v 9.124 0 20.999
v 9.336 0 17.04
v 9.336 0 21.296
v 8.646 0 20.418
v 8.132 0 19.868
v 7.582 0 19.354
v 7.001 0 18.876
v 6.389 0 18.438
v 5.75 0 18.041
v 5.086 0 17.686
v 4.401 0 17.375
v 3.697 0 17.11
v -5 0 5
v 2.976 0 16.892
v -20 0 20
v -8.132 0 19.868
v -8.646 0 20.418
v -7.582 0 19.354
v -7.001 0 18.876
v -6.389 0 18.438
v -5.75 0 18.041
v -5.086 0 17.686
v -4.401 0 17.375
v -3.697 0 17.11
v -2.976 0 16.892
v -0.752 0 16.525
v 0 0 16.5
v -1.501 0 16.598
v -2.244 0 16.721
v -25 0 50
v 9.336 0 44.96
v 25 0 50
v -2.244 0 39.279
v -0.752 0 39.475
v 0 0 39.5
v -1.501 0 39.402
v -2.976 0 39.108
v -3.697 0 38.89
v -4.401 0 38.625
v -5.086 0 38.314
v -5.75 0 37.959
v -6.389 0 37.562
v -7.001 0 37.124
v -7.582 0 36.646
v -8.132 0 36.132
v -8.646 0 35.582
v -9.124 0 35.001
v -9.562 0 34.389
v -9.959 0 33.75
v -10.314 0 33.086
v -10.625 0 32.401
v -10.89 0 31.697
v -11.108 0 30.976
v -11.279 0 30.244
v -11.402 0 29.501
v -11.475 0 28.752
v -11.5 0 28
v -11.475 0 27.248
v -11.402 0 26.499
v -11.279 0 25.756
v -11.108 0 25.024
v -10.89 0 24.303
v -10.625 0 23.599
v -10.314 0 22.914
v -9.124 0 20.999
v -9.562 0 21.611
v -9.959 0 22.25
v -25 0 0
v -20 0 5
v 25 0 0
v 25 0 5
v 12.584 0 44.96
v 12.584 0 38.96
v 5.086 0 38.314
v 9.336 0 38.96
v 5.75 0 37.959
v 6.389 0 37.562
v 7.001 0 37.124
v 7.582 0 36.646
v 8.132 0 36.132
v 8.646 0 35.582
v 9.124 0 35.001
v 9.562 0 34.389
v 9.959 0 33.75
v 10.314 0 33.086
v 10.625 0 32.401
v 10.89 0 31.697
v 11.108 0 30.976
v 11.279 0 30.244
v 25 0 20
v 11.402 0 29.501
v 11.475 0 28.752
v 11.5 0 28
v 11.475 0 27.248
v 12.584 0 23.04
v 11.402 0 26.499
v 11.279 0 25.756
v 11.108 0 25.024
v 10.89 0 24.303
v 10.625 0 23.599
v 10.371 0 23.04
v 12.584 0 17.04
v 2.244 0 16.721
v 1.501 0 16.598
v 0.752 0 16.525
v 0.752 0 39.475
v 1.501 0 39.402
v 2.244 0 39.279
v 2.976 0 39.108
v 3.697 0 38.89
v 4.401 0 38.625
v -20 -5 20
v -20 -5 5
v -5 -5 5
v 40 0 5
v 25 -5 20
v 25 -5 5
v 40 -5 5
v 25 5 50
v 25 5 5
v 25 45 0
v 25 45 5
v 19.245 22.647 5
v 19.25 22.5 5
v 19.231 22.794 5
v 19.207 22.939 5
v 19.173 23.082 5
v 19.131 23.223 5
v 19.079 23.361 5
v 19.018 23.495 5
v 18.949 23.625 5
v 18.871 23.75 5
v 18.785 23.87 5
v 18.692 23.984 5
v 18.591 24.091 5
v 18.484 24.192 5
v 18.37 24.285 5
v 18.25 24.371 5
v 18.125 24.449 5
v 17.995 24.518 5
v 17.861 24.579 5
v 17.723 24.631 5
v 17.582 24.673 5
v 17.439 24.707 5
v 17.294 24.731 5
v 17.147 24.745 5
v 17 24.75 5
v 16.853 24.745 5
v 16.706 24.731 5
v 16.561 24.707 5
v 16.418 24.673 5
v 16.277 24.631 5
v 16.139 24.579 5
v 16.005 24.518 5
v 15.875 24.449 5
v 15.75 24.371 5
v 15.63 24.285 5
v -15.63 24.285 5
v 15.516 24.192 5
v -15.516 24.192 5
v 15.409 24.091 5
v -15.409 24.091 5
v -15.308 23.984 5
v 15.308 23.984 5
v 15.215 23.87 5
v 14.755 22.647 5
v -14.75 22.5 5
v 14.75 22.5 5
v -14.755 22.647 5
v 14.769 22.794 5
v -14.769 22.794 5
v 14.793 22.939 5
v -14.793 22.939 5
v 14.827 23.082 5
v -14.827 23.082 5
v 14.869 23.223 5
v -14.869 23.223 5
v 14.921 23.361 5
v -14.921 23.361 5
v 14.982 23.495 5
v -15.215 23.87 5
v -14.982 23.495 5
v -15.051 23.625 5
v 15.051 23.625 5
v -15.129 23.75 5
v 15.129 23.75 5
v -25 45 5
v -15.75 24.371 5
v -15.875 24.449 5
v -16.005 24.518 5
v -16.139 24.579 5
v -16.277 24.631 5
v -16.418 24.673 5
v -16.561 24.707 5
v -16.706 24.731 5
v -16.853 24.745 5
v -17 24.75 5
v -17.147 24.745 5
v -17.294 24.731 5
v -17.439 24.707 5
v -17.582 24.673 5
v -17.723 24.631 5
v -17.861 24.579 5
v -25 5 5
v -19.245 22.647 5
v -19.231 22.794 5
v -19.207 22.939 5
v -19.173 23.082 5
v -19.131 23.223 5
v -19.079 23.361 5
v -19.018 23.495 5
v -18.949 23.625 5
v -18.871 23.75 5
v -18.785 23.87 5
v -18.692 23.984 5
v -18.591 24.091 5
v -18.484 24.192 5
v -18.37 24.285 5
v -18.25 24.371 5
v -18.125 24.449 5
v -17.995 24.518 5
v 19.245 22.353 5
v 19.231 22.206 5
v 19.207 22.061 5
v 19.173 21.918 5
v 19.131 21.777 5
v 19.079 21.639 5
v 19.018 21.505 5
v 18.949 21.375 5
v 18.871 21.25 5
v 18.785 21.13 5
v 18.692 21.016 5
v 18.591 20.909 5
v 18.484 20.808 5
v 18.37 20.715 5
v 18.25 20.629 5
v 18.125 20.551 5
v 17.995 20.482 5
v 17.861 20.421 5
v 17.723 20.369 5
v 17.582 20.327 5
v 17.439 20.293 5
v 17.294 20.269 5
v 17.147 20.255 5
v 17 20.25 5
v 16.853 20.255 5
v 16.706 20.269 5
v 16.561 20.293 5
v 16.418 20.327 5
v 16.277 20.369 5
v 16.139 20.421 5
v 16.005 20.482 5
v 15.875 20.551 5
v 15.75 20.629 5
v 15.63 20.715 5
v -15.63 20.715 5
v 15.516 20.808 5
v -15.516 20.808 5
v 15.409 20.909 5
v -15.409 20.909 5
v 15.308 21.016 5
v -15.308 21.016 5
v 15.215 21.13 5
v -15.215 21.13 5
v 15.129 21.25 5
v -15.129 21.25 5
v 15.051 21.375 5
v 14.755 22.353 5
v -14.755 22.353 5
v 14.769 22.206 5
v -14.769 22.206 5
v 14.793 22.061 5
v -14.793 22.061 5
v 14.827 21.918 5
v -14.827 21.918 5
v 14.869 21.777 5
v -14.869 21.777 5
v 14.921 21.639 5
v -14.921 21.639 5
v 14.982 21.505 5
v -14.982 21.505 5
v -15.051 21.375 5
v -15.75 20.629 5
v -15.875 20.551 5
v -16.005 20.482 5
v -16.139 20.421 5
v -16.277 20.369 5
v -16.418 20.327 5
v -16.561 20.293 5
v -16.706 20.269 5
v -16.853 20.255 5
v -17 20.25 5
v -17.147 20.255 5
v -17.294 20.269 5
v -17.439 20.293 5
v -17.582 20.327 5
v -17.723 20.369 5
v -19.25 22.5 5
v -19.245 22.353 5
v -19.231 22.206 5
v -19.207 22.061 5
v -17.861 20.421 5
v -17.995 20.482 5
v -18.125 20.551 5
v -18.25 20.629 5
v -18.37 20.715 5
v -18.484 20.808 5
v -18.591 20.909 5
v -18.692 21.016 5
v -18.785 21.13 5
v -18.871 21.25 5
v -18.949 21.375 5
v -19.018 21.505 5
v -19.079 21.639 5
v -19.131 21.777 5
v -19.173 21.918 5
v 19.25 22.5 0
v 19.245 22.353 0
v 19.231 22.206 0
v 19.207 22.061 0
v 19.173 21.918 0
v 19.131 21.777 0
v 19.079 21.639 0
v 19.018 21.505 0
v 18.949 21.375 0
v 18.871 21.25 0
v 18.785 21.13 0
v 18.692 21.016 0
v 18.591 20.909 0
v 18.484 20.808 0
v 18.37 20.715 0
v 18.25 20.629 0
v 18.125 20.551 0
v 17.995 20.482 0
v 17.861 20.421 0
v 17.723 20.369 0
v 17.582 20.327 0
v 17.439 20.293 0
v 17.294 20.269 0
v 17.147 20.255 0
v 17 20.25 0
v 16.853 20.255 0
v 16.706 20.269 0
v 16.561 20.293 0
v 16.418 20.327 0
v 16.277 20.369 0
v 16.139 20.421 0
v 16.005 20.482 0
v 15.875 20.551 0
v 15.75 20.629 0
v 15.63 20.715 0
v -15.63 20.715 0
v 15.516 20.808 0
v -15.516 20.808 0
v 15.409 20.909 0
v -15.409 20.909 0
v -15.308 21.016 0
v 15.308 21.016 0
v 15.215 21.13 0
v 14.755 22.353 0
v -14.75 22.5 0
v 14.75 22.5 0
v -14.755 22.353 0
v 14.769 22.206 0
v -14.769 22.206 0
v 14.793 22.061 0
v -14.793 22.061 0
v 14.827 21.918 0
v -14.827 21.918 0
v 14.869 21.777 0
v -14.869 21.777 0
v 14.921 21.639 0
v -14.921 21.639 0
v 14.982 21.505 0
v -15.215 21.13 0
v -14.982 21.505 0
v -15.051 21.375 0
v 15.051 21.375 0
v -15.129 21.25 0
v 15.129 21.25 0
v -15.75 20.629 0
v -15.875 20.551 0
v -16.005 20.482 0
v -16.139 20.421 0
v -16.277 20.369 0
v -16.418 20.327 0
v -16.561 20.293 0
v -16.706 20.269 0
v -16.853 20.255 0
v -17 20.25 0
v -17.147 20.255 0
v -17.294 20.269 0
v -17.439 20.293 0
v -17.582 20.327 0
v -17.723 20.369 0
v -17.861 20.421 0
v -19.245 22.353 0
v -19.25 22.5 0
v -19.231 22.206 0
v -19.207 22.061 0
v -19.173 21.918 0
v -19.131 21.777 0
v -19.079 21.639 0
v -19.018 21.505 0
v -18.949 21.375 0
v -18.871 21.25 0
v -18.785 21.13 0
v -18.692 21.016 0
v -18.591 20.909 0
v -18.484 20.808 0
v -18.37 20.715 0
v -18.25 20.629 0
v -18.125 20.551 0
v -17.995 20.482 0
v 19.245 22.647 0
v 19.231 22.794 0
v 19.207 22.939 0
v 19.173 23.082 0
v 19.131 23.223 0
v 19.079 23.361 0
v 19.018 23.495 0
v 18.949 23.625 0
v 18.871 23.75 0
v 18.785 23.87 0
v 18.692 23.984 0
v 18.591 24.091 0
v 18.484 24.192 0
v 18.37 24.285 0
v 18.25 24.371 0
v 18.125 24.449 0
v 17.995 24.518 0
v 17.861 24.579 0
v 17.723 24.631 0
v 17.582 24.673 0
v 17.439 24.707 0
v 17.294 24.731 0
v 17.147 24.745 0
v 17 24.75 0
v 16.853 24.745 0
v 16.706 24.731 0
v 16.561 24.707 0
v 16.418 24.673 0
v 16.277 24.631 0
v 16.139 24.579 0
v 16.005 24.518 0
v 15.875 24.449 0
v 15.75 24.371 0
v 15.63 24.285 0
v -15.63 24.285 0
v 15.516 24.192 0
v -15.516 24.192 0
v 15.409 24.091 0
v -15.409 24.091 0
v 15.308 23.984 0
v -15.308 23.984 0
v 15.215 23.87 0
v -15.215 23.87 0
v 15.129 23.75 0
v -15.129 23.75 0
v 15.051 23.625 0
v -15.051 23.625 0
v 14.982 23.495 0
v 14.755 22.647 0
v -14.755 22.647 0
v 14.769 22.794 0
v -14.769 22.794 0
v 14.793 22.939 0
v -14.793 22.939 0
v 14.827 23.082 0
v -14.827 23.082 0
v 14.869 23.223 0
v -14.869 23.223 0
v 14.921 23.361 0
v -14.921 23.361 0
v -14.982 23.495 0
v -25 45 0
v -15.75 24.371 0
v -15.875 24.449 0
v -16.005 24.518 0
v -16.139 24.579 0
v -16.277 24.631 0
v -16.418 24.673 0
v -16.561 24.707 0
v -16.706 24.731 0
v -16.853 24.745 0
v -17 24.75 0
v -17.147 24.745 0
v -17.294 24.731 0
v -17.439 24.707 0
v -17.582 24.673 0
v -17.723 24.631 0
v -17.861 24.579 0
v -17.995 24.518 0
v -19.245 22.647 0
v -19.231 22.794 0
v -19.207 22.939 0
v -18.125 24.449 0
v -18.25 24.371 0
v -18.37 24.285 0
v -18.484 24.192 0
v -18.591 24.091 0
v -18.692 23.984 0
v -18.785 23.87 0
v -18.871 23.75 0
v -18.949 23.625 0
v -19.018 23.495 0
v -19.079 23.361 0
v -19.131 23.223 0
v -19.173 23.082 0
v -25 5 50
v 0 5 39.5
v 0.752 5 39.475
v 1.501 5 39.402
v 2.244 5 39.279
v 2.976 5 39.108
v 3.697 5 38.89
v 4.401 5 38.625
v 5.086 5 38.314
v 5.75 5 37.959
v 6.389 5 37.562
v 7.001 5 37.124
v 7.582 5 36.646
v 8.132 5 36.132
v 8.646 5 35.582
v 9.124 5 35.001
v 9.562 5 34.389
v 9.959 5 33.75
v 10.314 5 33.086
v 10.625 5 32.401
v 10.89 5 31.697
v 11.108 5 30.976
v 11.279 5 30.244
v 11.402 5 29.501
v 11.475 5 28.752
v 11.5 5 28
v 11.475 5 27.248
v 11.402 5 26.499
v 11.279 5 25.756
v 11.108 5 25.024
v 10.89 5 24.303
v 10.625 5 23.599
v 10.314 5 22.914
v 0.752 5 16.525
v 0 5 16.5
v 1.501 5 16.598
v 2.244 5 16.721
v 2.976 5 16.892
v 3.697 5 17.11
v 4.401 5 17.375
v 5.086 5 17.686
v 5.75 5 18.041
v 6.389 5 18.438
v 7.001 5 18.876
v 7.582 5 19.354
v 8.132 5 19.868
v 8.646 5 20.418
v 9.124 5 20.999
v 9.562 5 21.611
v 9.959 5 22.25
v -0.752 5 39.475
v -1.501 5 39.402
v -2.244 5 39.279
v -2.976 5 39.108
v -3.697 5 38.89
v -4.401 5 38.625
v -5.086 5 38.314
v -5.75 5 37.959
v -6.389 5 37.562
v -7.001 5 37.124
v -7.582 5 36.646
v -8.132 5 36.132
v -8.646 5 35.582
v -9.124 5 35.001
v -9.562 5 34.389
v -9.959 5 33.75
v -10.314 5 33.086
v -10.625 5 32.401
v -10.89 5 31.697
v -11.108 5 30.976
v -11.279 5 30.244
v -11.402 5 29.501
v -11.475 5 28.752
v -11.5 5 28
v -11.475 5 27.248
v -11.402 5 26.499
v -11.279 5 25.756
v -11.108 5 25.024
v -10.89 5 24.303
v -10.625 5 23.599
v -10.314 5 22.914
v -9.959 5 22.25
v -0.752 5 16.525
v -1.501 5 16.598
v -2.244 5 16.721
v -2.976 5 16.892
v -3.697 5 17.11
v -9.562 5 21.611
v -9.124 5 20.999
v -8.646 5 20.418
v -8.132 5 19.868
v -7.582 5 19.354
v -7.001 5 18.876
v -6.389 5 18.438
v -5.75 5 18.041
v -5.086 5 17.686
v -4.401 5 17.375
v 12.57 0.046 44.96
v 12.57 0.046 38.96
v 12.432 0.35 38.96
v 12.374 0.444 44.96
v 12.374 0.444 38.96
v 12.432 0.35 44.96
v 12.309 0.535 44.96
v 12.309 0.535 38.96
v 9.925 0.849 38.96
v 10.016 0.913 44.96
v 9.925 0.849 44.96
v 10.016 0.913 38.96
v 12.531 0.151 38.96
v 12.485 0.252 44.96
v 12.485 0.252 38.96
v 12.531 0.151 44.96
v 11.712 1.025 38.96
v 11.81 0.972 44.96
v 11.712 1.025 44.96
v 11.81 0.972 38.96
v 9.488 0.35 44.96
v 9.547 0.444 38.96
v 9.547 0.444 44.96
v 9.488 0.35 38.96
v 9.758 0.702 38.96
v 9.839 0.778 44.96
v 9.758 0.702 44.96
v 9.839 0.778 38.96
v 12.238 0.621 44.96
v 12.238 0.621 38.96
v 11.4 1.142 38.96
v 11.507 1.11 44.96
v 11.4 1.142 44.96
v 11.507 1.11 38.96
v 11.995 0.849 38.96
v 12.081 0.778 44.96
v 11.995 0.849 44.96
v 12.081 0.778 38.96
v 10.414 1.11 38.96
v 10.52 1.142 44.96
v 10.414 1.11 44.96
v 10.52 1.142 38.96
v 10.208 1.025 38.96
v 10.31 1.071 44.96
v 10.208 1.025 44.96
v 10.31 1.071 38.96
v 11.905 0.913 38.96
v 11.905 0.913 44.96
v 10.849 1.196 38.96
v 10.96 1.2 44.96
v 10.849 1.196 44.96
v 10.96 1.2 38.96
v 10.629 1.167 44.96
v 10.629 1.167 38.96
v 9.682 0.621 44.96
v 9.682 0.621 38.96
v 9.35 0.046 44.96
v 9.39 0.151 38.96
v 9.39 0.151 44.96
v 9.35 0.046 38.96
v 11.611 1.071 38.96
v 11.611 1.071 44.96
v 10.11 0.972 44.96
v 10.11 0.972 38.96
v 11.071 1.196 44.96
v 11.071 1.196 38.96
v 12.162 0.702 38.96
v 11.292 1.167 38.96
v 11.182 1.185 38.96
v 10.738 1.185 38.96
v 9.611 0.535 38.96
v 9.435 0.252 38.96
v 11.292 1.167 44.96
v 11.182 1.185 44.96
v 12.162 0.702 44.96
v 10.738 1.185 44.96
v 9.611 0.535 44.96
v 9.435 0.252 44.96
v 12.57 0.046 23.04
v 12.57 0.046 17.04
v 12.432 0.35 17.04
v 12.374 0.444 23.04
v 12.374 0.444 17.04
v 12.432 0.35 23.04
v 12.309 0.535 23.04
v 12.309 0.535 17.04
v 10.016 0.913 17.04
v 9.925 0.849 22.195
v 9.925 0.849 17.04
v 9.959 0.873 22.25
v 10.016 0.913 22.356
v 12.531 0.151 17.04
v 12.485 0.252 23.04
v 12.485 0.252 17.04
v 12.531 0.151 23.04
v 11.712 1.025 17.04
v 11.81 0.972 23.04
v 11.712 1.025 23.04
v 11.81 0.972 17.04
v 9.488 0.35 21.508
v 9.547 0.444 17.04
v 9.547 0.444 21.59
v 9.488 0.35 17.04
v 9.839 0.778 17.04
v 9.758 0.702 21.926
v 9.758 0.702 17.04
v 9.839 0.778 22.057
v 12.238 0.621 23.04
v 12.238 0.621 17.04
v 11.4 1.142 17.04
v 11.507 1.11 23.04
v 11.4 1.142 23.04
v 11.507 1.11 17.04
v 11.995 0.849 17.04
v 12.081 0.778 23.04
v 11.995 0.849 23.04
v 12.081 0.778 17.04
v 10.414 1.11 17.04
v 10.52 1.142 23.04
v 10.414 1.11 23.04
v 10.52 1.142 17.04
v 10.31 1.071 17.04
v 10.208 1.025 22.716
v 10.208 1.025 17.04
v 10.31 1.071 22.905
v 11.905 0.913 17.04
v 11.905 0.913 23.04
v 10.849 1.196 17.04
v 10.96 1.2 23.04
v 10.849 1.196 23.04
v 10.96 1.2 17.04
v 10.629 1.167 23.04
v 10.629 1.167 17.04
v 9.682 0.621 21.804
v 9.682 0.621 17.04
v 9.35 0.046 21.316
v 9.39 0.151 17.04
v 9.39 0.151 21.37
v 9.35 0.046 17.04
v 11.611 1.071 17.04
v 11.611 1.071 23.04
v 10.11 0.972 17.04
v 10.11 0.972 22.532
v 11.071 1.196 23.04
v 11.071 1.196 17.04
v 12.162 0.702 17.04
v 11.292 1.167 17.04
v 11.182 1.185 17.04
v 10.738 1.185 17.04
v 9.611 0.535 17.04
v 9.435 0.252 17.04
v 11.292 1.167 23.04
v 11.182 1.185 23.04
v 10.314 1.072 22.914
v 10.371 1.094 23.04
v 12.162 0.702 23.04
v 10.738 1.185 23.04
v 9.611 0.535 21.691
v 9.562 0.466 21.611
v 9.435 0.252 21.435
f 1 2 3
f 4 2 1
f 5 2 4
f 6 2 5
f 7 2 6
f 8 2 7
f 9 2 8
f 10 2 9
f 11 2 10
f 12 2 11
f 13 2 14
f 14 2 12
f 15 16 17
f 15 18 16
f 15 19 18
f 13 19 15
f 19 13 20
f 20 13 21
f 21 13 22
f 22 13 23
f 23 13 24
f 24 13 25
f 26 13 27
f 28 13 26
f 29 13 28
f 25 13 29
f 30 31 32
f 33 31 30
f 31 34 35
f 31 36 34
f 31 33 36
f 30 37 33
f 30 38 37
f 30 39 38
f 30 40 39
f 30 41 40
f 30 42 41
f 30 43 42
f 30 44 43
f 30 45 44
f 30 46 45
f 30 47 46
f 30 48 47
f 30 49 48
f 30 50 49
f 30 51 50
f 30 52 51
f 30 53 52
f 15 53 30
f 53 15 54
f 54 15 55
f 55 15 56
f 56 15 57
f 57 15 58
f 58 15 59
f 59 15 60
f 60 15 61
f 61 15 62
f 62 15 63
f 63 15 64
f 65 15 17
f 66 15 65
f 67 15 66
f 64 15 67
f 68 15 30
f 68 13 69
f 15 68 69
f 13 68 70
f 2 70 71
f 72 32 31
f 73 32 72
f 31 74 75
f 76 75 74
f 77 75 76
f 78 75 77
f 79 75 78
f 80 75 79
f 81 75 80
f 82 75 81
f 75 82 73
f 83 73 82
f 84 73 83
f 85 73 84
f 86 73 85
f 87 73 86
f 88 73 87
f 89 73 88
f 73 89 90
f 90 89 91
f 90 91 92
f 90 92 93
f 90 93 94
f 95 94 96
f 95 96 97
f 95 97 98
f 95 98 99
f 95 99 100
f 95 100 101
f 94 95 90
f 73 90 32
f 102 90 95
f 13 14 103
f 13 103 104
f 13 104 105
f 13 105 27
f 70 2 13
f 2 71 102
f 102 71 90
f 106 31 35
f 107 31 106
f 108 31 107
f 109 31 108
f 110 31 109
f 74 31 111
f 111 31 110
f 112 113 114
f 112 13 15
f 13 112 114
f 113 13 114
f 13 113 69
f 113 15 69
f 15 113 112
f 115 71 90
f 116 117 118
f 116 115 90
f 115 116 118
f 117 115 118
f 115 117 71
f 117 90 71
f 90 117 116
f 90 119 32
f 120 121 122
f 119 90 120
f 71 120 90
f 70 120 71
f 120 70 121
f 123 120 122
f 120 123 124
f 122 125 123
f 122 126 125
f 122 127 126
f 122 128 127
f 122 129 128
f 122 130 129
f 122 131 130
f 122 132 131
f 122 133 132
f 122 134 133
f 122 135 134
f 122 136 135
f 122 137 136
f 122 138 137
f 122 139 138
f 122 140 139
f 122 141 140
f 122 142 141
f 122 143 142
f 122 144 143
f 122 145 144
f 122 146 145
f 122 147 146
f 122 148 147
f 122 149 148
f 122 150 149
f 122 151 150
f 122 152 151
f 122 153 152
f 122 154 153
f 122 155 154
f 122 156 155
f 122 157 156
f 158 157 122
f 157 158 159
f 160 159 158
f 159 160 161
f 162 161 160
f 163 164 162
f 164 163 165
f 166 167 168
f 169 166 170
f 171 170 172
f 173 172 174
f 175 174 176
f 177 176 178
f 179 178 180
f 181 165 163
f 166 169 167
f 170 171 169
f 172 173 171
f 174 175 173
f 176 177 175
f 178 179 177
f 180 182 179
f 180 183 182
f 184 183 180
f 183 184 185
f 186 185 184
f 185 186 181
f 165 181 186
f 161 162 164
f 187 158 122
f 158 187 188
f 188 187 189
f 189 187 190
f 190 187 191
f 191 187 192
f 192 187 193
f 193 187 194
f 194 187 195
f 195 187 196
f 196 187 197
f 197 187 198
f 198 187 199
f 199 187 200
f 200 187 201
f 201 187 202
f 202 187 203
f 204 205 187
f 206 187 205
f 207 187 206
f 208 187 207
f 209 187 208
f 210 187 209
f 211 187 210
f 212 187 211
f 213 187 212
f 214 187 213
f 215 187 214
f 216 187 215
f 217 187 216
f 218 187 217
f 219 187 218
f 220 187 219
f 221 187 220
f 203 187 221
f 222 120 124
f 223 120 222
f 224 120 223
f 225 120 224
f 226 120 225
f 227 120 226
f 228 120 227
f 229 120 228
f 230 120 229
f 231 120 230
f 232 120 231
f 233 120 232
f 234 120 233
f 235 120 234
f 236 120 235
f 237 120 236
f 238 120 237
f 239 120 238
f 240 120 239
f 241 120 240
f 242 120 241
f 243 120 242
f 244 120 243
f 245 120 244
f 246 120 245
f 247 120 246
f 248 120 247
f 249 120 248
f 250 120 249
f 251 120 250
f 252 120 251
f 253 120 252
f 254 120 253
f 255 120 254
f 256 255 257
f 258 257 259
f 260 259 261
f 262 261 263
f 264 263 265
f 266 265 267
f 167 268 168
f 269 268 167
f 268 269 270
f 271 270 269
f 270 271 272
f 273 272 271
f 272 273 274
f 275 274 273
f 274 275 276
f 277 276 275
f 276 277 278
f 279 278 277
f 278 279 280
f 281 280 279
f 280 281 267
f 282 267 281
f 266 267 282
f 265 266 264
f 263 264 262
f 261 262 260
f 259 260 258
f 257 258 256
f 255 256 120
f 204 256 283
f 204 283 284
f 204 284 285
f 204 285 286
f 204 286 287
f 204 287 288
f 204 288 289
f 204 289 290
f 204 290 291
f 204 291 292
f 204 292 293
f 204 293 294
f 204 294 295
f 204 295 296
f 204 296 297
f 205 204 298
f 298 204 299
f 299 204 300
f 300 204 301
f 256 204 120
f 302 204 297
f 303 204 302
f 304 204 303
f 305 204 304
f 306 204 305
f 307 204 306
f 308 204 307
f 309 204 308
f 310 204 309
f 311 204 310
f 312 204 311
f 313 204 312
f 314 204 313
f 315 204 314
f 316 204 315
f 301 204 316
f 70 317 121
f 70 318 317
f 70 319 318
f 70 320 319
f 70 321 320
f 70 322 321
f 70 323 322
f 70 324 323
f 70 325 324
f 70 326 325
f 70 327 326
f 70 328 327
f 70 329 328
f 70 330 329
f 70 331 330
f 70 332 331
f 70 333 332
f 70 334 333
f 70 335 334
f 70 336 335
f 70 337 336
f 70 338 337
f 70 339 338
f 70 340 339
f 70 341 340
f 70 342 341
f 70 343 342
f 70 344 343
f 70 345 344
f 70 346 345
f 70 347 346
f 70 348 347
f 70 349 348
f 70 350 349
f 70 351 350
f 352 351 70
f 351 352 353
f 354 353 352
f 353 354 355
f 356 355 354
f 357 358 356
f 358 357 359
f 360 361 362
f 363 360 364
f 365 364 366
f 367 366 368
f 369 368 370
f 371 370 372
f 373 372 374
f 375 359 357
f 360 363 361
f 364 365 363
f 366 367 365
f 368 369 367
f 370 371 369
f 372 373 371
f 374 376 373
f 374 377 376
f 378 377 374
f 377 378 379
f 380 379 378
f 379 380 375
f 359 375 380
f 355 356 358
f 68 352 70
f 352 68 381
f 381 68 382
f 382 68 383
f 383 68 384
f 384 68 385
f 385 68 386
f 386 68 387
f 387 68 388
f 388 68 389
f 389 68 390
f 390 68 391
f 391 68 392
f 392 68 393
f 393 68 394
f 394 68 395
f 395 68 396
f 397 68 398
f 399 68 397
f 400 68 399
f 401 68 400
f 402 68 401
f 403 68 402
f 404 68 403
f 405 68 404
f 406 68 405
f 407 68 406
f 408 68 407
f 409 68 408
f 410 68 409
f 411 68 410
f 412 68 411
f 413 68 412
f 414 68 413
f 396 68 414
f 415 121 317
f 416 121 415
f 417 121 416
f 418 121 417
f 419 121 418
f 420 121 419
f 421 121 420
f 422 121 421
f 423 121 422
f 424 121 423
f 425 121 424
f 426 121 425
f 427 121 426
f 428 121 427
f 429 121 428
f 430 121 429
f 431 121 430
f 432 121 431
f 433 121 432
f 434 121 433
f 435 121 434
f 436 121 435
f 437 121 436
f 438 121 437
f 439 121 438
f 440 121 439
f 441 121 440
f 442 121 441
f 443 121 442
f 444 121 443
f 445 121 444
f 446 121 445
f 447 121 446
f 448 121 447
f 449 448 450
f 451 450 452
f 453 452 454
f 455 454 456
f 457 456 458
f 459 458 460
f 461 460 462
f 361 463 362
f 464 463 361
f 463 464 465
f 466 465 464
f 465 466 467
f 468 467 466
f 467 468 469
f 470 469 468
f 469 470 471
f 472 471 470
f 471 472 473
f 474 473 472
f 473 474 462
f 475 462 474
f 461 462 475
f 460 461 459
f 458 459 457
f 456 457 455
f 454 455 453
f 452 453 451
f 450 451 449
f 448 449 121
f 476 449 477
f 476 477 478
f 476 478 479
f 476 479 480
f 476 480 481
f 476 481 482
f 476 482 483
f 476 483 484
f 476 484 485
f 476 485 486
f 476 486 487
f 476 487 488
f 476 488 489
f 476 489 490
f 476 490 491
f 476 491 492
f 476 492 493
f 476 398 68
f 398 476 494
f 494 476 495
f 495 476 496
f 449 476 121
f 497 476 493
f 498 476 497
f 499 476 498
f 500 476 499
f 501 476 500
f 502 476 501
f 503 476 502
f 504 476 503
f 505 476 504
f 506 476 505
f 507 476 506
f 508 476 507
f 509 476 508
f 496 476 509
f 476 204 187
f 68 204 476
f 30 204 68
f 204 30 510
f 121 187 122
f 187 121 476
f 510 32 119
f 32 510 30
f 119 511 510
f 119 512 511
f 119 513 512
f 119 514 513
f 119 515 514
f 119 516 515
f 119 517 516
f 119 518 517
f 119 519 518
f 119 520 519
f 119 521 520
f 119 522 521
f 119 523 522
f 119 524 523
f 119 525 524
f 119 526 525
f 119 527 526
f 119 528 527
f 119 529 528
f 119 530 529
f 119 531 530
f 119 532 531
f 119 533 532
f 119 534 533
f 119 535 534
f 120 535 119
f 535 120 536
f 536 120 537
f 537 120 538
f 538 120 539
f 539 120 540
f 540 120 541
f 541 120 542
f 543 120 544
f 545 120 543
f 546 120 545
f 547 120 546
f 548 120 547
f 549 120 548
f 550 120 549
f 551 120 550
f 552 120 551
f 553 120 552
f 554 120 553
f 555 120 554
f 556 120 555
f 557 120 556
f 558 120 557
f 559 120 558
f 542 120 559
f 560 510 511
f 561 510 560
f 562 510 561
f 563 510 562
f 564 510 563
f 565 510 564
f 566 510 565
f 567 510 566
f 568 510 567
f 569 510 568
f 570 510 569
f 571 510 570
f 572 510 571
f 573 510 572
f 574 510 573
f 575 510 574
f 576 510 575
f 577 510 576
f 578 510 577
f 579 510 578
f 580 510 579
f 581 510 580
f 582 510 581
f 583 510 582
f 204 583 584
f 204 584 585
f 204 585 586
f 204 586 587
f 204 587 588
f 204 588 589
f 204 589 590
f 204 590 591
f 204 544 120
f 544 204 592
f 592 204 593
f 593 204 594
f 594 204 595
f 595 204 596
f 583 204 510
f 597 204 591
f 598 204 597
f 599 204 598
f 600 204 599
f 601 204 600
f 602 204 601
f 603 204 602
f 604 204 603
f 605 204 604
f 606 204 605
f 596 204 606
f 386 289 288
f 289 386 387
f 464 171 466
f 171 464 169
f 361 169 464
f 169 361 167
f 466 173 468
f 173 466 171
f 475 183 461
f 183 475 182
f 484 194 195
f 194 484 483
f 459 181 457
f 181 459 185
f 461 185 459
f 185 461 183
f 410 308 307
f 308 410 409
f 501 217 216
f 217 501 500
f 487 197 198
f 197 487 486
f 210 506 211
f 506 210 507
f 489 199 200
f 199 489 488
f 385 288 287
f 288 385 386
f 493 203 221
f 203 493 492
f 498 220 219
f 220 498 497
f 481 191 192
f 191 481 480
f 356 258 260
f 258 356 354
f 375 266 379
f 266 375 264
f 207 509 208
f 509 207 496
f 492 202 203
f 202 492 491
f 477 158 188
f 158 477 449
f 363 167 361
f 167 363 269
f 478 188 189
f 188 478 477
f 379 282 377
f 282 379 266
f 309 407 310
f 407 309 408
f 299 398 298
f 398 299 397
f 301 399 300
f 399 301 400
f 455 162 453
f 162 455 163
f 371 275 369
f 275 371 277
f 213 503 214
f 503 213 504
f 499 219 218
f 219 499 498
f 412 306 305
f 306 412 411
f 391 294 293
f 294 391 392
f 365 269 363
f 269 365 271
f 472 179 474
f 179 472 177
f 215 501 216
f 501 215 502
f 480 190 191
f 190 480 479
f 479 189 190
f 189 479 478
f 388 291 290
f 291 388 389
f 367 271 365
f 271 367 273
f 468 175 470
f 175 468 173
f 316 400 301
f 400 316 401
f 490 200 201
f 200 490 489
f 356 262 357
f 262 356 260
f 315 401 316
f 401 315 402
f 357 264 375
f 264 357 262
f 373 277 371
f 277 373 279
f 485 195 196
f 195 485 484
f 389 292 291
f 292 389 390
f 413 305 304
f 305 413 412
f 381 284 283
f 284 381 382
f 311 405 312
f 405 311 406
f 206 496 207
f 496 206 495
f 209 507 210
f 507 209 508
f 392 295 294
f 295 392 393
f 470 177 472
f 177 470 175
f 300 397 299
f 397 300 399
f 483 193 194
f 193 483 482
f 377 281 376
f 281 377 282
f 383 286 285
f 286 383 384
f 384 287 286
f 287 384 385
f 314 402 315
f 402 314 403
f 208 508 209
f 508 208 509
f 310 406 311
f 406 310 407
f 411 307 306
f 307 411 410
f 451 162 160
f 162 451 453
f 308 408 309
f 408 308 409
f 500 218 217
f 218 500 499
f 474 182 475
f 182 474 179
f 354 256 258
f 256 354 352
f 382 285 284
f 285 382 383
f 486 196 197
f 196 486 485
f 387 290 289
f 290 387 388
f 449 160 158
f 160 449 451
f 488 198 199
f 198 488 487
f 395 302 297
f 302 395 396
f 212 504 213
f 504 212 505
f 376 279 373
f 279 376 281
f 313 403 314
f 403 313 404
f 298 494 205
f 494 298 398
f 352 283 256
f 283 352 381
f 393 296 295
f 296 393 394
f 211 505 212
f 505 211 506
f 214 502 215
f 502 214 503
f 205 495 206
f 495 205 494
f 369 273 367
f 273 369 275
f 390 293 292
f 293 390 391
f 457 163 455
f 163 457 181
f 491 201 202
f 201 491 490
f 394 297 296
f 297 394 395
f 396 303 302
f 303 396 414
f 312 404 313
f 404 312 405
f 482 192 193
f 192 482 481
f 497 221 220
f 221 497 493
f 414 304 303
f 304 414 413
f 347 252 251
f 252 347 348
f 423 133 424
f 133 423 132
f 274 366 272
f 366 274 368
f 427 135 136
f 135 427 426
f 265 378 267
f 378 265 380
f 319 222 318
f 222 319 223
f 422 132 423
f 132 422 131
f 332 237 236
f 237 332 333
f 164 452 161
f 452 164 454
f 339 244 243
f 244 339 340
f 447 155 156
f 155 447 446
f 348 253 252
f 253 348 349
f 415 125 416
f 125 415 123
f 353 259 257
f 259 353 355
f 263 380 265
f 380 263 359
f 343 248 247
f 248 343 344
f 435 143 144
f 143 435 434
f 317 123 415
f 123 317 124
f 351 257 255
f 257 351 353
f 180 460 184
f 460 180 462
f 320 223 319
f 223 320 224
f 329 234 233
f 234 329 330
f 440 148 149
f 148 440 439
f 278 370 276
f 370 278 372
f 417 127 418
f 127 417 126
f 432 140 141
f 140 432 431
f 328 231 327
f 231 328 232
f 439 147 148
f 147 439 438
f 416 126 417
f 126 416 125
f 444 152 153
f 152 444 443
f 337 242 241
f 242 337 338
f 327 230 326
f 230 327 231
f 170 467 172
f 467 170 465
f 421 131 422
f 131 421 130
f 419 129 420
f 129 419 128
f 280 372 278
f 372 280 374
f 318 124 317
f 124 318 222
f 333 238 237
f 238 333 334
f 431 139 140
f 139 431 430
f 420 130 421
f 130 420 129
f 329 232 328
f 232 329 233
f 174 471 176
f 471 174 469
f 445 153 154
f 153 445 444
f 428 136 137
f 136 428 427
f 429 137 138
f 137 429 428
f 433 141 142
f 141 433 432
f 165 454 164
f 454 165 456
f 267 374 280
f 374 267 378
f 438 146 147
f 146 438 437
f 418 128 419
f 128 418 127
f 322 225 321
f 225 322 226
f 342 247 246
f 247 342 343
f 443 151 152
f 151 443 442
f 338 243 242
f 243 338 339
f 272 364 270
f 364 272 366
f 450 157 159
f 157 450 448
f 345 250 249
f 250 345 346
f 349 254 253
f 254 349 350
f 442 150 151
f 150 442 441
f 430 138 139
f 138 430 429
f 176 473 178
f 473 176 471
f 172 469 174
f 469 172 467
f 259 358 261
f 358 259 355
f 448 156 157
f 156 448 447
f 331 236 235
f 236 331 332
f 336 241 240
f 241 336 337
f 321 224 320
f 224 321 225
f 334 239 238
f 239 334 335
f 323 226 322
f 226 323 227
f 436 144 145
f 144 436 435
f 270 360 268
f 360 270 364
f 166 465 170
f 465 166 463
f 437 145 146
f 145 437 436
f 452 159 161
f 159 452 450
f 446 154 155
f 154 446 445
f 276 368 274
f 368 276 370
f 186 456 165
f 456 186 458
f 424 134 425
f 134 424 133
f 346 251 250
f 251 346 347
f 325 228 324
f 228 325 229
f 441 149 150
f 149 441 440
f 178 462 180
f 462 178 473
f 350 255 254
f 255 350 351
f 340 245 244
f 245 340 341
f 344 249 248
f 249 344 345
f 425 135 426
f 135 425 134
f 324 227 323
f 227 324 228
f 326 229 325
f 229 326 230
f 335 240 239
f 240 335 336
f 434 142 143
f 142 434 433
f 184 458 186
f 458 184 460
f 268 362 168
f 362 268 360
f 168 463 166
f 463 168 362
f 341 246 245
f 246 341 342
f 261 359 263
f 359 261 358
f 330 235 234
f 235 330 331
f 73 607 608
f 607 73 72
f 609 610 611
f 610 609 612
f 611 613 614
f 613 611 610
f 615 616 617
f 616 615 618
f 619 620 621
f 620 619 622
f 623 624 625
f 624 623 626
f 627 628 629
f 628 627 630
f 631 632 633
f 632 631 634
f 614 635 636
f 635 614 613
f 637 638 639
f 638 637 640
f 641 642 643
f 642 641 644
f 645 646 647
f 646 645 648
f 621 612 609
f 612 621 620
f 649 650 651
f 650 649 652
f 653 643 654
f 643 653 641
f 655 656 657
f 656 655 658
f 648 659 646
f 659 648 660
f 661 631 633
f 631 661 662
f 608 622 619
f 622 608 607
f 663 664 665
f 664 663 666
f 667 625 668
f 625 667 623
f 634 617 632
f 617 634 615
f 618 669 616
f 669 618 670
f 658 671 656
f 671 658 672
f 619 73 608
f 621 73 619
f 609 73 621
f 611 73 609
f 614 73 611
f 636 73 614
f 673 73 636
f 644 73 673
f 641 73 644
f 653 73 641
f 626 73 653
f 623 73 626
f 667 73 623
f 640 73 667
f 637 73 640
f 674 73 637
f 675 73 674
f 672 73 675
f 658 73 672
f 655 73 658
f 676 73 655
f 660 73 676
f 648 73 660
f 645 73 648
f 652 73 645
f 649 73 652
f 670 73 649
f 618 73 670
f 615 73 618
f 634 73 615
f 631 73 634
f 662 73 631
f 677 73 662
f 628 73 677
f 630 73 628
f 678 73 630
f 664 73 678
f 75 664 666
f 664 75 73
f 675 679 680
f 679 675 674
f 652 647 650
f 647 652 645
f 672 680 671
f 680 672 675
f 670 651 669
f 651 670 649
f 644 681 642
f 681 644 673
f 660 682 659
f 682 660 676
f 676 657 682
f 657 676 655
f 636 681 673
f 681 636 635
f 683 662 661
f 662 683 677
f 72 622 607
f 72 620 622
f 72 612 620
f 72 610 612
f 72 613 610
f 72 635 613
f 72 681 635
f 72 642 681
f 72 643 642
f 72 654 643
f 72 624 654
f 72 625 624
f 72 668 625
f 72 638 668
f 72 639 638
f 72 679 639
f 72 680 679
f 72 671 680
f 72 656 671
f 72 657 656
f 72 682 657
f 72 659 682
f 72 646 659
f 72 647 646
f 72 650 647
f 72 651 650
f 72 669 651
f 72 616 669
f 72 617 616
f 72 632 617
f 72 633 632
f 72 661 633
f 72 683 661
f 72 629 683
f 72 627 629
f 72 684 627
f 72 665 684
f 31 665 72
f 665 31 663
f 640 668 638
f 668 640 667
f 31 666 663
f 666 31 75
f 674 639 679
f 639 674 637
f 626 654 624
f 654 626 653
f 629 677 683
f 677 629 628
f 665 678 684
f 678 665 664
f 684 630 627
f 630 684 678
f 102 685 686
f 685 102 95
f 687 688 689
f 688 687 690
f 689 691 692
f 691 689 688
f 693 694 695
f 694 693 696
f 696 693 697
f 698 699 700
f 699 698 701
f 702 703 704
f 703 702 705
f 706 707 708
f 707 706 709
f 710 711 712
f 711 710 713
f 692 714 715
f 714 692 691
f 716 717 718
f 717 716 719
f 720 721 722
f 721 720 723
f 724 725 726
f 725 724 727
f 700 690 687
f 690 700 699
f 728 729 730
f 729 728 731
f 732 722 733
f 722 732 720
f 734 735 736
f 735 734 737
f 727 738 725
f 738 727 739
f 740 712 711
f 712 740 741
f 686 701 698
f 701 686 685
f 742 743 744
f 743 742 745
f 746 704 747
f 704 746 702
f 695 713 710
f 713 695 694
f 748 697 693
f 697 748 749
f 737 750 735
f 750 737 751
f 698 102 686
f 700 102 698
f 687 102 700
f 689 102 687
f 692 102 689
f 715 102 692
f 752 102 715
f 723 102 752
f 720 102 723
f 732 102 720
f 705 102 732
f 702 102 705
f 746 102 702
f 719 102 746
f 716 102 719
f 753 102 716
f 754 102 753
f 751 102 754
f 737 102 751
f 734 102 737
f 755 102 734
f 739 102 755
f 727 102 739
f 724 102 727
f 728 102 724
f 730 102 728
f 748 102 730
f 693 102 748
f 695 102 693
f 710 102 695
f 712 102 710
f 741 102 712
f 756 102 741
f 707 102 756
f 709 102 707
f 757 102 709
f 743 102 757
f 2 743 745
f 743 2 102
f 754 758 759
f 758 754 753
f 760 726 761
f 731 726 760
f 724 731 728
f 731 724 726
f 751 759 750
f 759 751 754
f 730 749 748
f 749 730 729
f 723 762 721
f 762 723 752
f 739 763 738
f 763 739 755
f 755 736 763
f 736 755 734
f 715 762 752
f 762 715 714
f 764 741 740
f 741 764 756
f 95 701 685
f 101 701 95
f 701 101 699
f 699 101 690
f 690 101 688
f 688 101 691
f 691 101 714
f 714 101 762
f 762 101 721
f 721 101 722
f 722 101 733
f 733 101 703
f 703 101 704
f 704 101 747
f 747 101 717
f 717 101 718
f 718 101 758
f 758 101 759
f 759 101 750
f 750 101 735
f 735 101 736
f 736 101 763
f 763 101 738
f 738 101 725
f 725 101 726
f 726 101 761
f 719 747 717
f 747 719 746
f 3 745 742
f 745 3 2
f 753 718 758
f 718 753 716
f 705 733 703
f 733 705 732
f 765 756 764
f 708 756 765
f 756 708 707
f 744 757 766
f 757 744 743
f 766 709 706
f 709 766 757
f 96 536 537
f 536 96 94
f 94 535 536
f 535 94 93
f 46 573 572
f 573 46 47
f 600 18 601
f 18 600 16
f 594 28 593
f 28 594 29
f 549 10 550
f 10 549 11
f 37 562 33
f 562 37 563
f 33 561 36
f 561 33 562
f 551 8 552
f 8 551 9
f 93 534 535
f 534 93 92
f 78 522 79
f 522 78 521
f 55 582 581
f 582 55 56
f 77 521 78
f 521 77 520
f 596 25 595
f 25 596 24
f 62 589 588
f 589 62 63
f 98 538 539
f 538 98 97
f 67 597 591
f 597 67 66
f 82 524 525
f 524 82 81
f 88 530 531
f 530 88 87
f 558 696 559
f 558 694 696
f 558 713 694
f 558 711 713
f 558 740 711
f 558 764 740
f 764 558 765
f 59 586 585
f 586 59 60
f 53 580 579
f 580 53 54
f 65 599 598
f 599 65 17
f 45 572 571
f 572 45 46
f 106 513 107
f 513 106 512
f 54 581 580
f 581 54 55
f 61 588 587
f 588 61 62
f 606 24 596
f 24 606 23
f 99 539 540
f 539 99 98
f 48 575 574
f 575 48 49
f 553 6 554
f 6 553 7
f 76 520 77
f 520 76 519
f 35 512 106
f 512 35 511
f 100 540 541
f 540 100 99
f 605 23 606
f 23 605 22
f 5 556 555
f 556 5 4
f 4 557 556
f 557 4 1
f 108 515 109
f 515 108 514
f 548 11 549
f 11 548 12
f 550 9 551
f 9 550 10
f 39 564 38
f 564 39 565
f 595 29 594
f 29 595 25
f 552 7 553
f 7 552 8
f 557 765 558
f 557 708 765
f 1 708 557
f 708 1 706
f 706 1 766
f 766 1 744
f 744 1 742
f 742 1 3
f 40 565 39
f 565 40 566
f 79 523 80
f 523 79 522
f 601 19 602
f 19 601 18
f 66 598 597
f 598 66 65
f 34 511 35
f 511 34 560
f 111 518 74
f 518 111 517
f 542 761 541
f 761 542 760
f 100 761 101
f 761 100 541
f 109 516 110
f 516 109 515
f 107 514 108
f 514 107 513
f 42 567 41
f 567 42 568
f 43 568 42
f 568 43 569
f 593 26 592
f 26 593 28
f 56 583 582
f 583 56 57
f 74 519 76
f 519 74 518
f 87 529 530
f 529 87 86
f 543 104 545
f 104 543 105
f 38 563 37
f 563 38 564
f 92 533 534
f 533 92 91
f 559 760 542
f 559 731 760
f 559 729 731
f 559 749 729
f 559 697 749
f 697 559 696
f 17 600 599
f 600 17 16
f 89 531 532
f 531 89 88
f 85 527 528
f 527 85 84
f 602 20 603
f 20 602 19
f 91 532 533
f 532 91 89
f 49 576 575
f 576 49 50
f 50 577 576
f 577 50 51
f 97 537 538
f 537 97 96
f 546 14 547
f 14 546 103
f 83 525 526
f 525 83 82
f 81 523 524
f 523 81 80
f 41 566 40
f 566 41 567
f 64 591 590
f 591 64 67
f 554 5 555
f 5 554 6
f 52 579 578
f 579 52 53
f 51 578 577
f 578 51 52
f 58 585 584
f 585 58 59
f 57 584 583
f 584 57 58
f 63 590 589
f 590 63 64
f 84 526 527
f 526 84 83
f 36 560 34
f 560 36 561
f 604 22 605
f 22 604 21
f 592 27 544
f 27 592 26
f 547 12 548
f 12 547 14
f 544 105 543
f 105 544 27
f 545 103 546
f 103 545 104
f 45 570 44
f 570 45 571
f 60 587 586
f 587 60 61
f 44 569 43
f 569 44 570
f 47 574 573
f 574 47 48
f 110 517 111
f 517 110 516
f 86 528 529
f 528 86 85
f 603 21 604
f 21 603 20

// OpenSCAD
// L-shaped mounting bracket for a NEMA 17 stepper motor (e.g. syringe pump)
// Print orientation: base plate on the bed, vertical motor plate building up in +Z

// ---------------- Parameters ----------------
plate_x      = 25;    // base plate half-width in X (mm)
plate_y      = 45;    // base plate length in Y (mm)
plate_t      = 5;     // base plate thickness (mm)

motor_h      = 50;    // vertical motor plate height (mm)
motor_y      = 5;     // vertical motor plate thickness in Y (mm)

hole_boss    = 23;    // motor centring boss hole diameter (mm)
hole_boss_x  = 0;     // boss hole centre X (mm)
hole_boss_z  = 28;    // boss hole centre Z (mm)

hole_screw   = 3.4;   // M3 screw hole diameter (mm)
hole_screw_n = 4;     // number of screw holes
hole_screw_a = 31;    // square pattern pitch for screw holes (mm)

gusset_t     = 5;     // gusset thickness along X (mm)
gusset_leg   = 20;    // gusset right-triangle leg length (mm)

eps          = 0.5;   // cutter overshoot past faces (mm)
$fn          = 96;    // curve resolution

// ---------------- Model ----------------
difference() {
    union() {
        // Base plate: x -25..25, y 0..45, z 0..5
        translate([-plate_x, 0, 0])
            cube([plate_x * 2, plate_y, plate_t]);

        // Vertical motor plate: x -25..25, y 0..5, z 0..50
        translate([-plate_x, 0, 0])
            cube([plate_x * 2, motor_y, motor_h]);

        // Gussets: right triangles in YZ, flush with left and right edges
        for (sx = [-1, 1])
            translate([sx > 0 ? plate_x - gusset_t : -plate_x, 0, 0])
                rotate([90, 0, 0])
                    linear_extrude(height = gusset_t)
                        polygon(points = [
                            [gusset_t, gusset_t],   // right-angle corner at y=5, z=5
                            [gusset_leg, gusset_t], // +Y leg
                            [gusset_t, gusset_leg]  // +Z leg
                        ]);
    }

    // Base plate through-holes (M4) at (x = -17, y = 30) and (x = 17, y = 30)
    for (x = [-17, 17])
        translate([x, plate_y / 2, -eps])
            cylinder(d = 4.5, h = plate_t + 2 * eps);

    // Motor plate boss hole along Y, centred at x = 0, z = 28
    translate([hole_boss_x, -eps, hole_boss_z])
        rotate([-90, 0, 0])
            cylinder(d = hole_boss, h = motor_y + 2 * eps);

    // M3 screw holes on a 31 mm square pattern, centred on the boss hole
    for (i = [0 : hole_screw_n - 1]) {
        angle = i < hole_screw_n / 2 ? 45 : -45;
        translate([hole_boss_x + hole_screw_a / 2 * cos(angle),
                   -eps,
                   hole_boss_z + hole_screw_a / 2 * sin(angle)])
            cylinder(d = hole_screw, h = motor_y + 2 * eps);
    }
}
